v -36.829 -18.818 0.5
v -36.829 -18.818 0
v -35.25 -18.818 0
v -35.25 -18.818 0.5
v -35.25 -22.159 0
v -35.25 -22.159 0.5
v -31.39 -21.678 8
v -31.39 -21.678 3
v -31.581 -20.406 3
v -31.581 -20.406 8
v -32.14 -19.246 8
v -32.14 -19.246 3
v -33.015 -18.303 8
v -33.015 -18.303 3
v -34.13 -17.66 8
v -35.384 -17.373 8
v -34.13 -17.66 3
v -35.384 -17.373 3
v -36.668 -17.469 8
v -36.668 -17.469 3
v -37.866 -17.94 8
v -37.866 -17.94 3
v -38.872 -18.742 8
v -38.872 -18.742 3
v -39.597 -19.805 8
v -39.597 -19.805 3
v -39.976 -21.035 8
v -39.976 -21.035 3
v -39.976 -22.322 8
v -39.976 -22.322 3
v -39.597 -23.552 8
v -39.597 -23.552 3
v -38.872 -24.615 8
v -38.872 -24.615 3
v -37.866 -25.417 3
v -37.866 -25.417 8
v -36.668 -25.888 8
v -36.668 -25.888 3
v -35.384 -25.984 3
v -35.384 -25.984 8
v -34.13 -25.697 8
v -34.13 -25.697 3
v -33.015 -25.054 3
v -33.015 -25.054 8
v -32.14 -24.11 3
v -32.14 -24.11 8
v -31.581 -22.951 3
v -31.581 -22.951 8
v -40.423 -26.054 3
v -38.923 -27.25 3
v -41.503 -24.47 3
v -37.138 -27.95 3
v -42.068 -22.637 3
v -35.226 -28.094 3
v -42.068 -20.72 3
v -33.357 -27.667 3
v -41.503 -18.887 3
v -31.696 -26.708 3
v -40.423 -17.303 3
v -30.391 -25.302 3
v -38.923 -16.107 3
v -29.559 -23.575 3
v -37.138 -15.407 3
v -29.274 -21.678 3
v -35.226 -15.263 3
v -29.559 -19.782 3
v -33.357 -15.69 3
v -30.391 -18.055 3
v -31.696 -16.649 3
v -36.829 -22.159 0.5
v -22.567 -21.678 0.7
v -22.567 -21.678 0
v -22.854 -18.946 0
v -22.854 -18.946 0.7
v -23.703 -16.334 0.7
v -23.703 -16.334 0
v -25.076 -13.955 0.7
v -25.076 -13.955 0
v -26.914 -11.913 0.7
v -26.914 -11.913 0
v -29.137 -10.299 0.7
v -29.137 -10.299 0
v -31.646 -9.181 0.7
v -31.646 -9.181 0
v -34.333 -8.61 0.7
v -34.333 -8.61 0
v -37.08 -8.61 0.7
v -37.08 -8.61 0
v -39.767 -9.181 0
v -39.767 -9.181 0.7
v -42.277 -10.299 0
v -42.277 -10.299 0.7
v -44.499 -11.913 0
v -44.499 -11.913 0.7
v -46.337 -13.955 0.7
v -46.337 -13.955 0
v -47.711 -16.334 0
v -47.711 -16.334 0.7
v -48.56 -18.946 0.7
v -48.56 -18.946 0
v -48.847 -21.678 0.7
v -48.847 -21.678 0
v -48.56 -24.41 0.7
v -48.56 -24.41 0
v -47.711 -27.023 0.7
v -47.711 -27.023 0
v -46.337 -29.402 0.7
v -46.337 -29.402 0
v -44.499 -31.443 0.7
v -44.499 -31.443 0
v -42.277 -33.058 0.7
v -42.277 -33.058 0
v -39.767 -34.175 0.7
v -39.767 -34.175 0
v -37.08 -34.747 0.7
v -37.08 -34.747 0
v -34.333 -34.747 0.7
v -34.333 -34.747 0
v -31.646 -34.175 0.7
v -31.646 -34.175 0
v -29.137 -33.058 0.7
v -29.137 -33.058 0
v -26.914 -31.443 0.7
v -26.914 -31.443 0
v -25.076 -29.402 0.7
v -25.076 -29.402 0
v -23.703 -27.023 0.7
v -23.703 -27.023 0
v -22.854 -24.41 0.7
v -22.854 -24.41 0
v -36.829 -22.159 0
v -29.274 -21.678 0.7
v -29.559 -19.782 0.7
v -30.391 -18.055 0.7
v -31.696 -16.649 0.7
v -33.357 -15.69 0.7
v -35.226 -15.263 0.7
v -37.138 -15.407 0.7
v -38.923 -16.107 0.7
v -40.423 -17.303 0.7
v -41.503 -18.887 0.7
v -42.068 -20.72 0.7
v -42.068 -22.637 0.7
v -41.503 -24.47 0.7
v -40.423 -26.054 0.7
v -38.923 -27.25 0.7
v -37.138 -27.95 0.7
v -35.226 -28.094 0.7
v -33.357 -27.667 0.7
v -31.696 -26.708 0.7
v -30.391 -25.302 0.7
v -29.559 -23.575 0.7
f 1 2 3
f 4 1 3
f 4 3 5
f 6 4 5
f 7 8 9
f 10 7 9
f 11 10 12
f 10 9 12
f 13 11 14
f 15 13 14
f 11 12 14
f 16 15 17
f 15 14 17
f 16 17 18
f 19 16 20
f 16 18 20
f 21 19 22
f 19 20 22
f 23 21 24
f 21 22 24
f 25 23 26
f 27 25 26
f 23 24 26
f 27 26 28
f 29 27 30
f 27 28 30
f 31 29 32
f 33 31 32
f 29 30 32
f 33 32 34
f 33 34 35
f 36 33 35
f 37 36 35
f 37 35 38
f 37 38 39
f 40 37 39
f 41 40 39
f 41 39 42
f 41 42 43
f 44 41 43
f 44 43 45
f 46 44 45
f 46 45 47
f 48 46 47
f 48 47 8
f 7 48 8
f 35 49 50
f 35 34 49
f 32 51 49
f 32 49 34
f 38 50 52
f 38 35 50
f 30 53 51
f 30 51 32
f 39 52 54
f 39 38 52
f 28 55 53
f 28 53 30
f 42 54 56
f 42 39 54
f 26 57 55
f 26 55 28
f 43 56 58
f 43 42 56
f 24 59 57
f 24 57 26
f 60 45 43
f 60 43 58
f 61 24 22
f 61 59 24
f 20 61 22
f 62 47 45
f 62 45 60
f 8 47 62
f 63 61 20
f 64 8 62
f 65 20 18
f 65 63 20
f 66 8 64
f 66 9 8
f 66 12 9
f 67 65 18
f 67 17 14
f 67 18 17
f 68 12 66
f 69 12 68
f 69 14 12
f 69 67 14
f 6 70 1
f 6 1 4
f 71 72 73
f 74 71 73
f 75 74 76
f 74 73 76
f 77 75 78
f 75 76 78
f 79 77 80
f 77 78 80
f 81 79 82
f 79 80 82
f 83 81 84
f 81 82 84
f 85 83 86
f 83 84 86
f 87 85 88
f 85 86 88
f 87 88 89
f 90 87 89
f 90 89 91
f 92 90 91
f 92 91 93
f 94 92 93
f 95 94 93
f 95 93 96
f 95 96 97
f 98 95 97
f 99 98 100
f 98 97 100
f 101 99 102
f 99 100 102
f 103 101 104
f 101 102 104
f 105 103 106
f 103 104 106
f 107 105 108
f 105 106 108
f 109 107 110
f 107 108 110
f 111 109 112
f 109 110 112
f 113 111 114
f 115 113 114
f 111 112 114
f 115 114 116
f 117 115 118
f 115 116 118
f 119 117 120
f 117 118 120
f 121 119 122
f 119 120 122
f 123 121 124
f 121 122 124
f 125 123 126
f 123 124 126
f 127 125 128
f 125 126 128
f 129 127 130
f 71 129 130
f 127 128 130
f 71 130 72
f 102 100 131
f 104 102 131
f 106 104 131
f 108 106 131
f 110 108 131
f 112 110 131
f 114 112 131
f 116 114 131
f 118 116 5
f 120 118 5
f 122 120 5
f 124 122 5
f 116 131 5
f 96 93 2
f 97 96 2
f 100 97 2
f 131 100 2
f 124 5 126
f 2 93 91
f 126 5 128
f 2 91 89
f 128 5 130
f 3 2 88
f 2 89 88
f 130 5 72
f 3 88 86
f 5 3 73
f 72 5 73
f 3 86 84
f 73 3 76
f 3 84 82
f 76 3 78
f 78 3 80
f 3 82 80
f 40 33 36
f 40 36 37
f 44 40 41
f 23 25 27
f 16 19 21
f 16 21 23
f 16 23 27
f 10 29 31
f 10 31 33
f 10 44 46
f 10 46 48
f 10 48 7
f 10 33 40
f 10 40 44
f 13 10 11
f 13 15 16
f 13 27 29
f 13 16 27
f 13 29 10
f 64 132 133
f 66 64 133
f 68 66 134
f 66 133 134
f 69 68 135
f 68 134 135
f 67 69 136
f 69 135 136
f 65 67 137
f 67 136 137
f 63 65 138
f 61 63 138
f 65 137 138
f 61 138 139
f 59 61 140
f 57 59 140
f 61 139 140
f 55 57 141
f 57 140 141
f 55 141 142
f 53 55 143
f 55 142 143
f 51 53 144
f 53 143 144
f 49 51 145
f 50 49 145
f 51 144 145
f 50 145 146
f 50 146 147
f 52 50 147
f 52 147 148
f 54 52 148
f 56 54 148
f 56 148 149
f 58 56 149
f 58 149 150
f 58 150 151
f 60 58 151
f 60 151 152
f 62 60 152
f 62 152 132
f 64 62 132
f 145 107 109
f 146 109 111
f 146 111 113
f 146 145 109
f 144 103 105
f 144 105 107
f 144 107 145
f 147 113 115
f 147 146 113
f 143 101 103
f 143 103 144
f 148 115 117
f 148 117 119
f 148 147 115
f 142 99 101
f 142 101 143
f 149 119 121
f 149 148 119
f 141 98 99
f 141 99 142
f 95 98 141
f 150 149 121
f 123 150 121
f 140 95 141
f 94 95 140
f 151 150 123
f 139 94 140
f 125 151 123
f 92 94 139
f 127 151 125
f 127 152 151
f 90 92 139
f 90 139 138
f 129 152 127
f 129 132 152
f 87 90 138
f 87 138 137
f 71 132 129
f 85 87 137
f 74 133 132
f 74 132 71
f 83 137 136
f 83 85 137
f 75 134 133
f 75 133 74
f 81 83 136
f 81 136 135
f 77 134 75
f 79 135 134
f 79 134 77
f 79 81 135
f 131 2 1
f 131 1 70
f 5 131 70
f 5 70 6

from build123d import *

# Parameters (mm, degrees)
F0_R      = 4.325
F1_DEPTH  = 3
F0_R_2    = 5
F1_FACE_R = 4.325
F2_DEPTH  = 0.7
F0_R_3    = 13.1400703873
F0_R_4    = 6.4331806046
F0_R_5    = 4.3173351149
F3_DEPTH  = 8
F4_DEPTH  = 3
F7_W      = 1.5792734921
F7_H      = 3.3408720046
F8_DEPTH  = 0.5


with BuildPart() as f1:
    # F0 (on Top) → F1 (new body)
    with BuildSketch(Plane.XY):
        Circle(F0_R)
    extrude(amount=-F1_DEPTH)

    # F0 (on Top) + F1_face (on face) → F2 (join)
    with BuildSketch(Plane.XY):
        Circle(F0_R_2)
        Circle(F0_R, mode=Mode.SUBTRACT)
    with BuildSketch(Plane.XY):
        Circle(F1_FACE_R)
    extrude(amount=F2_DEPTH)


with BuildPart() as f2:
    # F0 (on Top) → F2, piece 2 (new body)
    with BuildSketch(Plane.XY):
        with Locations((-35.7068367302, -21.6784439981)):
            Circle(F0_R_3)
        with Locations((-35.7068367302, -21.6784439981)):
            Circle(F0_R_4, mode=Mode.SUBTRACT)
    extrude(amount=F2_DEPTH)


with BuildPart() as f3:
    # F0 (on Top) → F3 (new body)
    with BuildSketch(Plane.XY):
        with Locations((-35.7068367302, -21.6784439981)):
            Circle(F0_R_5)
    extrude(amount=F3_DEPTH)


with BuildPart() as f4:
    # F0 (on Top) → F4 (new body)
    with BuildSketch(Plane.XY):
        with Locations((-35.7068367302, -21.6784439981)):
            Circle(F0_R_4)
        with Locations((-35.7068367302, -21.6784439981)):
            Circle(F0_R_5, mode=Mode.SUBTRACT)
    extrude(amount=F4_DEPTH)


with BuildPart() as f2_1:
    add(f2.part)

    # F6: union F3, F4
    add(f3.part)
    add(f4.part)

    # F7 (on face) → F8 (cut)
    with BuildSketch(Plane(origin=(0, 0, 0), x_dir=(1, 0, 0), z_dir=(0, 0, -1))):
        with Locations((-36.0395330936, 20.4883767292)):
            Rectangle(F7_W, F7_H)
    extrude(amount=-F8_DEPTH, mode=Mode.SUBTRACT)


solid = f2_1.part
